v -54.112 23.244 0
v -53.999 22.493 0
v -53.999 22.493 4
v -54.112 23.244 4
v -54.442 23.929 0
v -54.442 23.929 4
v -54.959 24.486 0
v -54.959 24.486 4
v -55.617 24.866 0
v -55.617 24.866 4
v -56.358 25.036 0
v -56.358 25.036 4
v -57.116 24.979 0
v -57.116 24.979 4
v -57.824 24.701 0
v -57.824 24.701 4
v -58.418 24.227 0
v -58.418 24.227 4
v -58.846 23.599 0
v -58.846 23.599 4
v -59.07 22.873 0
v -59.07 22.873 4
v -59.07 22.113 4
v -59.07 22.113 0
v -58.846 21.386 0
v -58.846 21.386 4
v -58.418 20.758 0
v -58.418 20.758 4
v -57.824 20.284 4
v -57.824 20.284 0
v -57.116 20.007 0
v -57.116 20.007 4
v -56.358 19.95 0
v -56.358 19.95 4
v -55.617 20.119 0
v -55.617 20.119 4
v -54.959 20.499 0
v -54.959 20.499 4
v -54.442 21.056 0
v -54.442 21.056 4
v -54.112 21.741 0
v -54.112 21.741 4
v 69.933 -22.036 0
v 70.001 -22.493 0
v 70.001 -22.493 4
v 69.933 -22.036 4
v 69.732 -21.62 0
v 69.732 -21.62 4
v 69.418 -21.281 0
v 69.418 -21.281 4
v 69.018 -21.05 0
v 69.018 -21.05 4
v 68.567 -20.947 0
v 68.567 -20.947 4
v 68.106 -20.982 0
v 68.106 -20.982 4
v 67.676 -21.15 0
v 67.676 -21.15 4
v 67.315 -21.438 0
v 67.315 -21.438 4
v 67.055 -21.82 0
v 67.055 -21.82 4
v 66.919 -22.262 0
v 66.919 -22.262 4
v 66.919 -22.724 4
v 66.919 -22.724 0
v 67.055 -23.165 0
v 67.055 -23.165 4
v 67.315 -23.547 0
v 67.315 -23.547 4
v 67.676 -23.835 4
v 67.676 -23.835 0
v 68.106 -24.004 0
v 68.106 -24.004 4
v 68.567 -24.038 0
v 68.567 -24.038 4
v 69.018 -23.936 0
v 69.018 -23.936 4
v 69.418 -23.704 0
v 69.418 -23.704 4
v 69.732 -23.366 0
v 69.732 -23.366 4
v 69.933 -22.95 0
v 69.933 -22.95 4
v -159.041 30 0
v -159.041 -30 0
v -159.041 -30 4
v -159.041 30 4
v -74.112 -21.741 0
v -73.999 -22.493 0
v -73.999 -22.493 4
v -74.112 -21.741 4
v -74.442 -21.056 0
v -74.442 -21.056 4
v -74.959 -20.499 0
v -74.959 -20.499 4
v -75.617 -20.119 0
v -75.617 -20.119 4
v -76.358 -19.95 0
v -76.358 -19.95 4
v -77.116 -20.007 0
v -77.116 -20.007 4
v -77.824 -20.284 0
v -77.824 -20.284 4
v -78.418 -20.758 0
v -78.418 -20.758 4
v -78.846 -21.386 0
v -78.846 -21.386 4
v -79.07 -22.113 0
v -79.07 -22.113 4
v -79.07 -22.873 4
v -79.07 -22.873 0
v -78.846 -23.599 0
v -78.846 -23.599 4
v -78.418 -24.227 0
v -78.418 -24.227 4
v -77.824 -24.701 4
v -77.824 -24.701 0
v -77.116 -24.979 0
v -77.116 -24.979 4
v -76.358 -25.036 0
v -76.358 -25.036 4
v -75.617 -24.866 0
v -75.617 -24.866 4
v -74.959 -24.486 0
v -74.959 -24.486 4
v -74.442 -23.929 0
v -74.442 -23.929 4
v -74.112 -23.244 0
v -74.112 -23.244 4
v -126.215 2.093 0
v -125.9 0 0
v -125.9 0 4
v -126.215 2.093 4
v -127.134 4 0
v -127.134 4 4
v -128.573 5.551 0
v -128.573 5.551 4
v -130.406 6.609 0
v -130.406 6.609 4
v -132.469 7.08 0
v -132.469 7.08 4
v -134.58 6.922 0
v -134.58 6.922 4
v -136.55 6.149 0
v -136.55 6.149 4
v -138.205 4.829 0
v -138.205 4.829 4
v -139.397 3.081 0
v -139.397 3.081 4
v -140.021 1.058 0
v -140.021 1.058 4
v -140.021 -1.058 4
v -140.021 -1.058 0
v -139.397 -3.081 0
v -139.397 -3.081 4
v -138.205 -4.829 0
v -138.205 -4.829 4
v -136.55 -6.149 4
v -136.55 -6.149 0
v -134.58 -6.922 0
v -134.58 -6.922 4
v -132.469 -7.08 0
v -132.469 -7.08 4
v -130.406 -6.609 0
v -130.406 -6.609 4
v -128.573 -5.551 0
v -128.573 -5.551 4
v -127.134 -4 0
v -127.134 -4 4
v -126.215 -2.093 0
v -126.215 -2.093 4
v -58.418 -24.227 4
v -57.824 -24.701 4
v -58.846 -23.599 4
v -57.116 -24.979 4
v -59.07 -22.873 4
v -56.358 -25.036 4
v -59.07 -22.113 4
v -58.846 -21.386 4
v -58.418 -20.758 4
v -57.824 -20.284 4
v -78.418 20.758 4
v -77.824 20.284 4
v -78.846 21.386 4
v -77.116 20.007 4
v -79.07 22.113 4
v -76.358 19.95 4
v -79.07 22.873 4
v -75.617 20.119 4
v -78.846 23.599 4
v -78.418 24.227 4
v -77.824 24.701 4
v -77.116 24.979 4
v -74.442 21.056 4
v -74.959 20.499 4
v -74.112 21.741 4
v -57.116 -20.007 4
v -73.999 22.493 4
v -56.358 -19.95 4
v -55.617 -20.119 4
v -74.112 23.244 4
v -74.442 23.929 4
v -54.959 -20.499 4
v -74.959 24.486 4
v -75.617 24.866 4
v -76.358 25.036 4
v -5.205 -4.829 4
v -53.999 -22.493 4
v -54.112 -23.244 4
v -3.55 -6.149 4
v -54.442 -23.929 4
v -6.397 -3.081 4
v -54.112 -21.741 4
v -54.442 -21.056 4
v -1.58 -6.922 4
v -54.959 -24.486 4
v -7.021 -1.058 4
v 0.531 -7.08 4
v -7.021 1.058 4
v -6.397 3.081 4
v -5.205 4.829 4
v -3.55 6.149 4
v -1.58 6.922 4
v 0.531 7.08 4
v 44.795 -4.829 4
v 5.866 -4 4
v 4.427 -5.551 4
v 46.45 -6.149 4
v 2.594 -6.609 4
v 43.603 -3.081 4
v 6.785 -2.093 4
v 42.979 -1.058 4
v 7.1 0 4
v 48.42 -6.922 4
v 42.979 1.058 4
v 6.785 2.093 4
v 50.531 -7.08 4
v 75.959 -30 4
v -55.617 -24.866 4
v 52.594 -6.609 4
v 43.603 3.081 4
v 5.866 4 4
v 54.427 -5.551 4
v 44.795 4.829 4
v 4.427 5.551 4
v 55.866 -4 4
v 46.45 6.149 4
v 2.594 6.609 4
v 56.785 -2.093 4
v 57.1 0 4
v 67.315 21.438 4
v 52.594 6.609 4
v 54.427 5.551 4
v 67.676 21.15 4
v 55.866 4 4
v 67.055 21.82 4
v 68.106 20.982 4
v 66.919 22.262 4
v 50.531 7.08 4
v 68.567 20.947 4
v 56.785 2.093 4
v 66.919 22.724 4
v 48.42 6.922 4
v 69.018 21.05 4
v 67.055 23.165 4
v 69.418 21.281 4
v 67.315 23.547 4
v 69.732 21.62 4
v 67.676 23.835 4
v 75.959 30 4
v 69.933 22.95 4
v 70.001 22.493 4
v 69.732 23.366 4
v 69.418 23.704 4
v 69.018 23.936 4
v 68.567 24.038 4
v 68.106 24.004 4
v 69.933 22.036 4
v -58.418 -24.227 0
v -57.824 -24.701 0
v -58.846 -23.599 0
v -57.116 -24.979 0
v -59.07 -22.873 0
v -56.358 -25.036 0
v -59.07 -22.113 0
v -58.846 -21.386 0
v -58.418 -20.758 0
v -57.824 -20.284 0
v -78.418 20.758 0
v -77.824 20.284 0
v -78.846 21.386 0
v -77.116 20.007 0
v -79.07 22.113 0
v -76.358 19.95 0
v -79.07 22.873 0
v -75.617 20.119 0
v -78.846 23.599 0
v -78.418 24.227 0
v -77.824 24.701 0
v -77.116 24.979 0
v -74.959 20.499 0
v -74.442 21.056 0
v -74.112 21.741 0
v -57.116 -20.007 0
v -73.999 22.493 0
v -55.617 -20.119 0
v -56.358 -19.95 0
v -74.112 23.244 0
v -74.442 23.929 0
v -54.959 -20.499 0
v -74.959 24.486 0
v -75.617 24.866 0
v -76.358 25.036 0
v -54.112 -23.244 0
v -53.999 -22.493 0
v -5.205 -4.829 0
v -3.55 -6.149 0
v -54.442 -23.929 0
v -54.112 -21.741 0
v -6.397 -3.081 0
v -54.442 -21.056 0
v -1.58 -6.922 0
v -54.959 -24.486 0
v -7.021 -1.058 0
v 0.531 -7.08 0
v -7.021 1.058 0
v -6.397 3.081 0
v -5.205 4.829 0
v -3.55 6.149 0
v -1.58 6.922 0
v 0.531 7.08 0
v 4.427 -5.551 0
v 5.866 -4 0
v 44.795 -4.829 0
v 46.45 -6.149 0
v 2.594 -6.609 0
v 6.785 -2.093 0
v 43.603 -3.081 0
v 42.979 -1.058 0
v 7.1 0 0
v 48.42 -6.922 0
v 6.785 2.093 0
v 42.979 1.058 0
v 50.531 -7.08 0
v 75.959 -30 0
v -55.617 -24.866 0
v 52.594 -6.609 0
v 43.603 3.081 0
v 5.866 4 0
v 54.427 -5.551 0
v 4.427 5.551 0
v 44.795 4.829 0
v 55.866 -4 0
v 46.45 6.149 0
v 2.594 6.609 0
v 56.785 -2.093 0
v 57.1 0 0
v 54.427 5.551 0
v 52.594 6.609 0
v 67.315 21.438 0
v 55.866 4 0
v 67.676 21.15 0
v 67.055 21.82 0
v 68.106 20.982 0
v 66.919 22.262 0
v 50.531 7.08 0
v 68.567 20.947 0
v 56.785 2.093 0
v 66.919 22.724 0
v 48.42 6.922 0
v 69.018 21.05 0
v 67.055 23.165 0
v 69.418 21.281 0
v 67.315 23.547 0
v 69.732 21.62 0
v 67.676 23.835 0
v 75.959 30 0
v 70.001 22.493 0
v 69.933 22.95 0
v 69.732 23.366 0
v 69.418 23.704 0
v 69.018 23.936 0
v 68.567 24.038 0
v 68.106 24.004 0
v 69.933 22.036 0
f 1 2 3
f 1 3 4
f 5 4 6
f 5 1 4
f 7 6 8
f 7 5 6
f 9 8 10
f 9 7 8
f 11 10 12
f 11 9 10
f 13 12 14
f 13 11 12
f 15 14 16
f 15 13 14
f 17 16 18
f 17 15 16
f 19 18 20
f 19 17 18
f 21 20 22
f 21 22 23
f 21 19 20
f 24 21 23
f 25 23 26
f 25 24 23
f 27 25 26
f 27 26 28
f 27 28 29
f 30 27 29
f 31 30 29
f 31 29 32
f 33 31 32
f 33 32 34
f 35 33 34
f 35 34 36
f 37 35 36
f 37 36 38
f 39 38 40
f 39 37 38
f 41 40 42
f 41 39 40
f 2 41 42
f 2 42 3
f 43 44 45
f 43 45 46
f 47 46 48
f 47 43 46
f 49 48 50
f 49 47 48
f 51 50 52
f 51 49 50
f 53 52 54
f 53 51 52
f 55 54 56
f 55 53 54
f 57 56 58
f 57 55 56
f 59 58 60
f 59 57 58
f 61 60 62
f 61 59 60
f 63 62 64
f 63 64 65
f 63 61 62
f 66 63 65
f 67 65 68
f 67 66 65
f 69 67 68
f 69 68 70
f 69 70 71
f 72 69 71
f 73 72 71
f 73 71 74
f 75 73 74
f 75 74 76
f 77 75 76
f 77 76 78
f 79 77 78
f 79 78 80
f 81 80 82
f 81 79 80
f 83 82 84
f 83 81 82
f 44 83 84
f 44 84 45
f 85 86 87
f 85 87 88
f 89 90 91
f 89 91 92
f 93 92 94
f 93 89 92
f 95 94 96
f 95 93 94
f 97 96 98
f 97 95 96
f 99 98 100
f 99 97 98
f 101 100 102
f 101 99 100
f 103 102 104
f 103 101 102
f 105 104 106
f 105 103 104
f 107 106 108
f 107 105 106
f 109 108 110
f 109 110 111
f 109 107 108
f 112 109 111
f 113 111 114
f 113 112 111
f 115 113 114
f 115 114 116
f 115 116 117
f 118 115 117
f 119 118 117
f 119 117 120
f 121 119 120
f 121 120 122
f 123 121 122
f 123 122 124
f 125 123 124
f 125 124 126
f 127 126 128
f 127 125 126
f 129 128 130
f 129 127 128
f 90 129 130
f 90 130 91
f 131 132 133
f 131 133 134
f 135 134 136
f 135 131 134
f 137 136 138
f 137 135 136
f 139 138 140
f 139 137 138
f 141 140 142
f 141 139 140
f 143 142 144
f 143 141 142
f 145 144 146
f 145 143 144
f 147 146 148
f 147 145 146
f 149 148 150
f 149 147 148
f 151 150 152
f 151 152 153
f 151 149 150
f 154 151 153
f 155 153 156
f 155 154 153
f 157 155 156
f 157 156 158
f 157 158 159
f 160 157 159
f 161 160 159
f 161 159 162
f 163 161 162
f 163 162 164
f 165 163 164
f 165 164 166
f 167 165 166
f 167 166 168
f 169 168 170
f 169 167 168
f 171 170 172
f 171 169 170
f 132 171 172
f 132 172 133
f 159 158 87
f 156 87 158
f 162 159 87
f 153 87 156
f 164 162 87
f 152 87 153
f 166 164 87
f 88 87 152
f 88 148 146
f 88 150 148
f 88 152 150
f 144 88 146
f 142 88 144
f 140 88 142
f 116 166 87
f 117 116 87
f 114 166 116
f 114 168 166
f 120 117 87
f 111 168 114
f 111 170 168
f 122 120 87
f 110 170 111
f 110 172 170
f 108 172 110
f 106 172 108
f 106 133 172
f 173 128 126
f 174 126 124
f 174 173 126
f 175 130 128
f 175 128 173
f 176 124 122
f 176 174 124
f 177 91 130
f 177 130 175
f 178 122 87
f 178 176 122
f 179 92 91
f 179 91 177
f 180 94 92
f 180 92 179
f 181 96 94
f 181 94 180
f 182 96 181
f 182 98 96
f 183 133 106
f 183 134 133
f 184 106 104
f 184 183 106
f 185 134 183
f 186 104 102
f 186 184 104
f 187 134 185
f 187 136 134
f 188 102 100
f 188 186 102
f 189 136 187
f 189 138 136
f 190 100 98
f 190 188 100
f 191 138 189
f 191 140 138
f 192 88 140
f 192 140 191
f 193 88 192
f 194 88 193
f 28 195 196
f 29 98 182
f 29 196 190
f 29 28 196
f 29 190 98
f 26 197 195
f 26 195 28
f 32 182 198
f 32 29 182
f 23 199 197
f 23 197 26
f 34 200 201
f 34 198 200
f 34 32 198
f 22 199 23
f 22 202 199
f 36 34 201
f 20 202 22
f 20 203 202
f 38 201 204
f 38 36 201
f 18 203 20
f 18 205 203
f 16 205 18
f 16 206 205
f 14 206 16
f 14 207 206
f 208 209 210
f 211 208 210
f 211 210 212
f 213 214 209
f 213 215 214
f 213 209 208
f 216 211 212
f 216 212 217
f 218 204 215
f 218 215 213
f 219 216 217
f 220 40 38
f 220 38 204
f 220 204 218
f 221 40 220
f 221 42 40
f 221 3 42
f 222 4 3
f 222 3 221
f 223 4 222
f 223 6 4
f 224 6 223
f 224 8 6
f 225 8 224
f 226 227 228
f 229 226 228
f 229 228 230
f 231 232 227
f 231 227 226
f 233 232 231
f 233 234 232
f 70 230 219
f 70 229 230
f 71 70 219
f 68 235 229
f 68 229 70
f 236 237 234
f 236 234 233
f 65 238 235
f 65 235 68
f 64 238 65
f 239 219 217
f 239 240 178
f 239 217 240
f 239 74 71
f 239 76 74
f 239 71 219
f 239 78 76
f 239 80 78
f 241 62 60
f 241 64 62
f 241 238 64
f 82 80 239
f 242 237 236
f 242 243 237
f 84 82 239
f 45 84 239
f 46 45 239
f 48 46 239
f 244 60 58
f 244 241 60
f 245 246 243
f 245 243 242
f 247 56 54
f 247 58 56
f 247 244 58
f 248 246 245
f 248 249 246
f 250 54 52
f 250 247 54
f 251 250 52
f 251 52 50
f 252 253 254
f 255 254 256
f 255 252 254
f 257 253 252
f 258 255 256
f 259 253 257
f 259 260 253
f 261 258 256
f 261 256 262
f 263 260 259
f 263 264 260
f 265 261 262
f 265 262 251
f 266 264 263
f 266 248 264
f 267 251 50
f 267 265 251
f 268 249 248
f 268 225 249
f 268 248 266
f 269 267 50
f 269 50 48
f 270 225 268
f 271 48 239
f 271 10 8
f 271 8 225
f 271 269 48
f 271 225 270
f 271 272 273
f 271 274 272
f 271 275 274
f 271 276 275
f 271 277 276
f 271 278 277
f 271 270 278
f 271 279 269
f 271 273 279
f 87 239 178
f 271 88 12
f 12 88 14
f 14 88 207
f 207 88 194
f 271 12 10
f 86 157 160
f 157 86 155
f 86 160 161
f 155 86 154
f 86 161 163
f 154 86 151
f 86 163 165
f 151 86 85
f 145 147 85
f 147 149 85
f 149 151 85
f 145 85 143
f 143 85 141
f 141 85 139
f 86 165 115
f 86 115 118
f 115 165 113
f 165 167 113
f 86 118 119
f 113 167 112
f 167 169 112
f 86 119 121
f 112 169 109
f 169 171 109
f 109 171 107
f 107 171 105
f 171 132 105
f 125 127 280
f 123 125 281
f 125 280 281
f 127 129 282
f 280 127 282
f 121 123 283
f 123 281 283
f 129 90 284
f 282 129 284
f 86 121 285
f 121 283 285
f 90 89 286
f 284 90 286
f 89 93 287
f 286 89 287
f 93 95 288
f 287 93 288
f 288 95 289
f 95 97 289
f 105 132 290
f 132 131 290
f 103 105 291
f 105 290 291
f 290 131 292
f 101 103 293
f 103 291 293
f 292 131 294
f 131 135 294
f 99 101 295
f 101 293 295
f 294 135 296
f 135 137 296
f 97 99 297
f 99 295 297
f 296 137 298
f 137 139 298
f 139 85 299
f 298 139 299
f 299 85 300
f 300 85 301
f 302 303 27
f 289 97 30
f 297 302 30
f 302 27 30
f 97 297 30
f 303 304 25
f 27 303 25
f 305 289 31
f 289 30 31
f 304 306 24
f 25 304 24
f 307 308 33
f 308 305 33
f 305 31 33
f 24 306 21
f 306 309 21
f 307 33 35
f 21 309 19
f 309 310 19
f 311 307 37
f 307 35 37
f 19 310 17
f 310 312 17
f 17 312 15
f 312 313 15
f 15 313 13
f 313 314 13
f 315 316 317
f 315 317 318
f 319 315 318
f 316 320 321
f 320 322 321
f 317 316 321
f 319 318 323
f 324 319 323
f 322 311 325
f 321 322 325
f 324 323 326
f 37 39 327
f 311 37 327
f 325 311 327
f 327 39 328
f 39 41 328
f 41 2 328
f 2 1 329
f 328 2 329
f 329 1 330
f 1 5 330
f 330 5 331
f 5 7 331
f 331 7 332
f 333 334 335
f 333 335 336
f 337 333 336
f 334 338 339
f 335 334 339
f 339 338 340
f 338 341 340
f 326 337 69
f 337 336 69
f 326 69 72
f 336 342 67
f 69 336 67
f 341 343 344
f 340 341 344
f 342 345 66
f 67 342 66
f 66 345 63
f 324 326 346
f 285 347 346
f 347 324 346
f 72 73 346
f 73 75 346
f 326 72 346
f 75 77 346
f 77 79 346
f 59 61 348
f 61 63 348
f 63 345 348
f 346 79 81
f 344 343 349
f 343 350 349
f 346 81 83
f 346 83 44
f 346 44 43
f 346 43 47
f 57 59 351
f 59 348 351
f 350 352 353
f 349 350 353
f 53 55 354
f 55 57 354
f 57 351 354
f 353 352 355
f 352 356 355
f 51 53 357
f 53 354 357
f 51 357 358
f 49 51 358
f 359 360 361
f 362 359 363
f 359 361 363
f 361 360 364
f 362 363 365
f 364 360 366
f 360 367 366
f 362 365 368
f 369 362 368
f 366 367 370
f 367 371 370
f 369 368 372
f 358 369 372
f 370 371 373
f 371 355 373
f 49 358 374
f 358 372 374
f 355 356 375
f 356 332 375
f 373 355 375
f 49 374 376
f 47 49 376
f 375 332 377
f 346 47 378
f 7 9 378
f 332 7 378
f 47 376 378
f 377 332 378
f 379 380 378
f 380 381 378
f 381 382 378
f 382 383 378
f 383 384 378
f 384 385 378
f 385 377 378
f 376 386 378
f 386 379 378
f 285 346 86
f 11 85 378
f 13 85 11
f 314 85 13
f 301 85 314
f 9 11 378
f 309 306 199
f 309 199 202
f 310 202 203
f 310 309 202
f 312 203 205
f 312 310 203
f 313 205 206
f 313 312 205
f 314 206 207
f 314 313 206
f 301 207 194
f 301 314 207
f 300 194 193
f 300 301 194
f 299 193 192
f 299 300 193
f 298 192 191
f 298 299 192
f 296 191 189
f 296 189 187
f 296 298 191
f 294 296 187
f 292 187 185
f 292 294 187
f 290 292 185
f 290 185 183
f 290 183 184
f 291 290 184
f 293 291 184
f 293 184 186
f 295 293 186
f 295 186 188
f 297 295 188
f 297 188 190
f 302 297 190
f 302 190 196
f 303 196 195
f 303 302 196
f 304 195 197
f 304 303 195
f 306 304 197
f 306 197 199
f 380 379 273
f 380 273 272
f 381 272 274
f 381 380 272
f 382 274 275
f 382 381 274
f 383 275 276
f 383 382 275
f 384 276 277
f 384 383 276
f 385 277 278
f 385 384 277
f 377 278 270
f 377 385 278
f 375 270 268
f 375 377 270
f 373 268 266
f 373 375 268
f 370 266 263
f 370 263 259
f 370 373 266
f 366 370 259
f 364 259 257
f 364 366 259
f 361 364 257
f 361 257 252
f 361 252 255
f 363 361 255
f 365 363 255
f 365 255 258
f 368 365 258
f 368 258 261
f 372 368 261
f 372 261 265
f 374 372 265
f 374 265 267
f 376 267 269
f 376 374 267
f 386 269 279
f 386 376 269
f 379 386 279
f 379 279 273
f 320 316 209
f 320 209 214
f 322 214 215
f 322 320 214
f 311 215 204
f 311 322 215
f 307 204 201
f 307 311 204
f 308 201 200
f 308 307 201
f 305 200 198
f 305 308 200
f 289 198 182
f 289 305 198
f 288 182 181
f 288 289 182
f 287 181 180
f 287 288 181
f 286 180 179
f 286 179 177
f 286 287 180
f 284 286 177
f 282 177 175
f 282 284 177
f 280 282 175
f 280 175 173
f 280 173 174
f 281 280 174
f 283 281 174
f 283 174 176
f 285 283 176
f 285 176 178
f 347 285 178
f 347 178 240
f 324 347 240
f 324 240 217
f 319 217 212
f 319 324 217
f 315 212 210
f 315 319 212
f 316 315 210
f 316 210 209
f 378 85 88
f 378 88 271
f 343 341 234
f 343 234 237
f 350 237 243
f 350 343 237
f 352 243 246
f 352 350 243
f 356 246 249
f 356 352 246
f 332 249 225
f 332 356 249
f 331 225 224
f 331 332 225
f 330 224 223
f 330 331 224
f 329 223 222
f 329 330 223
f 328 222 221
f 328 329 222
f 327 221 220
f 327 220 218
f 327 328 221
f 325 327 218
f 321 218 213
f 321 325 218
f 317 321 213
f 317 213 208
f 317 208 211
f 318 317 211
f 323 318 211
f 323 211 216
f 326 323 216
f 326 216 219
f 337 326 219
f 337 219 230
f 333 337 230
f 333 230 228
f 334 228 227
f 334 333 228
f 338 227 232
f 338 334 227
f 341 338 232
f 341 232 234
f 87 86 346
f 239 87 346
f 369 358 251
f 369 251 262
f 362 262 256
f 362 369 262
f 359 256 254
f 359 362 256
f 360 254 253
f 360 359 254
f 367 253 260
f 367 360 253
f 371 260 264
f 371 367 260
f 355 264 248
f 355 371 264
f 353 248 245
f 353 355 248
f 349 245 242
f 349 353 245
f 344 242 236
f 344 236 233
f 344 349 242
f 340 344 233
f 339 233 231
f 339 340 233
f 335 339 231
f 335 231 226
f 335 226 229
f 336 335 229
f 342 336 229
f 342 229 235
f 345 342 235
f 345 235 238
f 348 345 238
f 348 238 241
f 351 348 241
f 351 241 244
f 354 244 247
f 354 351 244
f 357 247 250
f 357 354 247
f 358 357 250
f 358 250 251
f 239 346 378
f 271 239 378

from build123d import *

# Parameters (mm, degrees)
SKETCH1_W           = 235
SKETCH1_H           = 60
SKETCH1_R           = 7.1
SKETCH1_R_2         = 1.55
SKETCH1_R_3         = 2.55
BOSS_EXTRUDE1_DEPTH = 4


with BuildPart() as part:
    # Sketch1 → Boss-Extrude1 (new body)
    with BuildSketch(Plane.XY):
        with Locations((-41.541275094, 0)):
            Rectangle(SKETCH1_W, SKETCH1_H)
        with Locations((-133, 0)):
            Circle(SKETCH1_R, mode=Mode.SUBTRACT)
        with Locations((50, 0)):
            Circle(SKETCH1_R, mode=Mode.SUBTRACT)
        Circle(SKETCH1_R, mode=Mode.SUBTRACT)
        with Locations((68.451377883, -22.492652976)):
            Circle(SKETCH1_R_2, mode=Mode.SUBTRACT)
        with Locations((68.451377883, 22.492652976)):
            Circle(SKETCH1_R_2, mode=Mode.SUBTRACT)
        with Locations((-56.548622117, -22.492652976)):
            Circle(SKETCH1_R_3, mode=Mode.SUBTRACT)
        with Locations((-56.548622117, 22.492652976)):
            Circle(SKETCH1_R_3, mode=Mode.SUBTRACT)
        with Locations((-76.548622117, -22.492652976)):
            Circle(SKETCH1_R_3, mode=Mode.SUBTRACT)
        with Locations((-76.548622117, 22.492652976)):
            Circle(SKETCH1_R_3, mode=Mode.SUBTRACT)
    extrude(amount=BOSS_EXTRUDE1_DEPTH)


solid = part.part
